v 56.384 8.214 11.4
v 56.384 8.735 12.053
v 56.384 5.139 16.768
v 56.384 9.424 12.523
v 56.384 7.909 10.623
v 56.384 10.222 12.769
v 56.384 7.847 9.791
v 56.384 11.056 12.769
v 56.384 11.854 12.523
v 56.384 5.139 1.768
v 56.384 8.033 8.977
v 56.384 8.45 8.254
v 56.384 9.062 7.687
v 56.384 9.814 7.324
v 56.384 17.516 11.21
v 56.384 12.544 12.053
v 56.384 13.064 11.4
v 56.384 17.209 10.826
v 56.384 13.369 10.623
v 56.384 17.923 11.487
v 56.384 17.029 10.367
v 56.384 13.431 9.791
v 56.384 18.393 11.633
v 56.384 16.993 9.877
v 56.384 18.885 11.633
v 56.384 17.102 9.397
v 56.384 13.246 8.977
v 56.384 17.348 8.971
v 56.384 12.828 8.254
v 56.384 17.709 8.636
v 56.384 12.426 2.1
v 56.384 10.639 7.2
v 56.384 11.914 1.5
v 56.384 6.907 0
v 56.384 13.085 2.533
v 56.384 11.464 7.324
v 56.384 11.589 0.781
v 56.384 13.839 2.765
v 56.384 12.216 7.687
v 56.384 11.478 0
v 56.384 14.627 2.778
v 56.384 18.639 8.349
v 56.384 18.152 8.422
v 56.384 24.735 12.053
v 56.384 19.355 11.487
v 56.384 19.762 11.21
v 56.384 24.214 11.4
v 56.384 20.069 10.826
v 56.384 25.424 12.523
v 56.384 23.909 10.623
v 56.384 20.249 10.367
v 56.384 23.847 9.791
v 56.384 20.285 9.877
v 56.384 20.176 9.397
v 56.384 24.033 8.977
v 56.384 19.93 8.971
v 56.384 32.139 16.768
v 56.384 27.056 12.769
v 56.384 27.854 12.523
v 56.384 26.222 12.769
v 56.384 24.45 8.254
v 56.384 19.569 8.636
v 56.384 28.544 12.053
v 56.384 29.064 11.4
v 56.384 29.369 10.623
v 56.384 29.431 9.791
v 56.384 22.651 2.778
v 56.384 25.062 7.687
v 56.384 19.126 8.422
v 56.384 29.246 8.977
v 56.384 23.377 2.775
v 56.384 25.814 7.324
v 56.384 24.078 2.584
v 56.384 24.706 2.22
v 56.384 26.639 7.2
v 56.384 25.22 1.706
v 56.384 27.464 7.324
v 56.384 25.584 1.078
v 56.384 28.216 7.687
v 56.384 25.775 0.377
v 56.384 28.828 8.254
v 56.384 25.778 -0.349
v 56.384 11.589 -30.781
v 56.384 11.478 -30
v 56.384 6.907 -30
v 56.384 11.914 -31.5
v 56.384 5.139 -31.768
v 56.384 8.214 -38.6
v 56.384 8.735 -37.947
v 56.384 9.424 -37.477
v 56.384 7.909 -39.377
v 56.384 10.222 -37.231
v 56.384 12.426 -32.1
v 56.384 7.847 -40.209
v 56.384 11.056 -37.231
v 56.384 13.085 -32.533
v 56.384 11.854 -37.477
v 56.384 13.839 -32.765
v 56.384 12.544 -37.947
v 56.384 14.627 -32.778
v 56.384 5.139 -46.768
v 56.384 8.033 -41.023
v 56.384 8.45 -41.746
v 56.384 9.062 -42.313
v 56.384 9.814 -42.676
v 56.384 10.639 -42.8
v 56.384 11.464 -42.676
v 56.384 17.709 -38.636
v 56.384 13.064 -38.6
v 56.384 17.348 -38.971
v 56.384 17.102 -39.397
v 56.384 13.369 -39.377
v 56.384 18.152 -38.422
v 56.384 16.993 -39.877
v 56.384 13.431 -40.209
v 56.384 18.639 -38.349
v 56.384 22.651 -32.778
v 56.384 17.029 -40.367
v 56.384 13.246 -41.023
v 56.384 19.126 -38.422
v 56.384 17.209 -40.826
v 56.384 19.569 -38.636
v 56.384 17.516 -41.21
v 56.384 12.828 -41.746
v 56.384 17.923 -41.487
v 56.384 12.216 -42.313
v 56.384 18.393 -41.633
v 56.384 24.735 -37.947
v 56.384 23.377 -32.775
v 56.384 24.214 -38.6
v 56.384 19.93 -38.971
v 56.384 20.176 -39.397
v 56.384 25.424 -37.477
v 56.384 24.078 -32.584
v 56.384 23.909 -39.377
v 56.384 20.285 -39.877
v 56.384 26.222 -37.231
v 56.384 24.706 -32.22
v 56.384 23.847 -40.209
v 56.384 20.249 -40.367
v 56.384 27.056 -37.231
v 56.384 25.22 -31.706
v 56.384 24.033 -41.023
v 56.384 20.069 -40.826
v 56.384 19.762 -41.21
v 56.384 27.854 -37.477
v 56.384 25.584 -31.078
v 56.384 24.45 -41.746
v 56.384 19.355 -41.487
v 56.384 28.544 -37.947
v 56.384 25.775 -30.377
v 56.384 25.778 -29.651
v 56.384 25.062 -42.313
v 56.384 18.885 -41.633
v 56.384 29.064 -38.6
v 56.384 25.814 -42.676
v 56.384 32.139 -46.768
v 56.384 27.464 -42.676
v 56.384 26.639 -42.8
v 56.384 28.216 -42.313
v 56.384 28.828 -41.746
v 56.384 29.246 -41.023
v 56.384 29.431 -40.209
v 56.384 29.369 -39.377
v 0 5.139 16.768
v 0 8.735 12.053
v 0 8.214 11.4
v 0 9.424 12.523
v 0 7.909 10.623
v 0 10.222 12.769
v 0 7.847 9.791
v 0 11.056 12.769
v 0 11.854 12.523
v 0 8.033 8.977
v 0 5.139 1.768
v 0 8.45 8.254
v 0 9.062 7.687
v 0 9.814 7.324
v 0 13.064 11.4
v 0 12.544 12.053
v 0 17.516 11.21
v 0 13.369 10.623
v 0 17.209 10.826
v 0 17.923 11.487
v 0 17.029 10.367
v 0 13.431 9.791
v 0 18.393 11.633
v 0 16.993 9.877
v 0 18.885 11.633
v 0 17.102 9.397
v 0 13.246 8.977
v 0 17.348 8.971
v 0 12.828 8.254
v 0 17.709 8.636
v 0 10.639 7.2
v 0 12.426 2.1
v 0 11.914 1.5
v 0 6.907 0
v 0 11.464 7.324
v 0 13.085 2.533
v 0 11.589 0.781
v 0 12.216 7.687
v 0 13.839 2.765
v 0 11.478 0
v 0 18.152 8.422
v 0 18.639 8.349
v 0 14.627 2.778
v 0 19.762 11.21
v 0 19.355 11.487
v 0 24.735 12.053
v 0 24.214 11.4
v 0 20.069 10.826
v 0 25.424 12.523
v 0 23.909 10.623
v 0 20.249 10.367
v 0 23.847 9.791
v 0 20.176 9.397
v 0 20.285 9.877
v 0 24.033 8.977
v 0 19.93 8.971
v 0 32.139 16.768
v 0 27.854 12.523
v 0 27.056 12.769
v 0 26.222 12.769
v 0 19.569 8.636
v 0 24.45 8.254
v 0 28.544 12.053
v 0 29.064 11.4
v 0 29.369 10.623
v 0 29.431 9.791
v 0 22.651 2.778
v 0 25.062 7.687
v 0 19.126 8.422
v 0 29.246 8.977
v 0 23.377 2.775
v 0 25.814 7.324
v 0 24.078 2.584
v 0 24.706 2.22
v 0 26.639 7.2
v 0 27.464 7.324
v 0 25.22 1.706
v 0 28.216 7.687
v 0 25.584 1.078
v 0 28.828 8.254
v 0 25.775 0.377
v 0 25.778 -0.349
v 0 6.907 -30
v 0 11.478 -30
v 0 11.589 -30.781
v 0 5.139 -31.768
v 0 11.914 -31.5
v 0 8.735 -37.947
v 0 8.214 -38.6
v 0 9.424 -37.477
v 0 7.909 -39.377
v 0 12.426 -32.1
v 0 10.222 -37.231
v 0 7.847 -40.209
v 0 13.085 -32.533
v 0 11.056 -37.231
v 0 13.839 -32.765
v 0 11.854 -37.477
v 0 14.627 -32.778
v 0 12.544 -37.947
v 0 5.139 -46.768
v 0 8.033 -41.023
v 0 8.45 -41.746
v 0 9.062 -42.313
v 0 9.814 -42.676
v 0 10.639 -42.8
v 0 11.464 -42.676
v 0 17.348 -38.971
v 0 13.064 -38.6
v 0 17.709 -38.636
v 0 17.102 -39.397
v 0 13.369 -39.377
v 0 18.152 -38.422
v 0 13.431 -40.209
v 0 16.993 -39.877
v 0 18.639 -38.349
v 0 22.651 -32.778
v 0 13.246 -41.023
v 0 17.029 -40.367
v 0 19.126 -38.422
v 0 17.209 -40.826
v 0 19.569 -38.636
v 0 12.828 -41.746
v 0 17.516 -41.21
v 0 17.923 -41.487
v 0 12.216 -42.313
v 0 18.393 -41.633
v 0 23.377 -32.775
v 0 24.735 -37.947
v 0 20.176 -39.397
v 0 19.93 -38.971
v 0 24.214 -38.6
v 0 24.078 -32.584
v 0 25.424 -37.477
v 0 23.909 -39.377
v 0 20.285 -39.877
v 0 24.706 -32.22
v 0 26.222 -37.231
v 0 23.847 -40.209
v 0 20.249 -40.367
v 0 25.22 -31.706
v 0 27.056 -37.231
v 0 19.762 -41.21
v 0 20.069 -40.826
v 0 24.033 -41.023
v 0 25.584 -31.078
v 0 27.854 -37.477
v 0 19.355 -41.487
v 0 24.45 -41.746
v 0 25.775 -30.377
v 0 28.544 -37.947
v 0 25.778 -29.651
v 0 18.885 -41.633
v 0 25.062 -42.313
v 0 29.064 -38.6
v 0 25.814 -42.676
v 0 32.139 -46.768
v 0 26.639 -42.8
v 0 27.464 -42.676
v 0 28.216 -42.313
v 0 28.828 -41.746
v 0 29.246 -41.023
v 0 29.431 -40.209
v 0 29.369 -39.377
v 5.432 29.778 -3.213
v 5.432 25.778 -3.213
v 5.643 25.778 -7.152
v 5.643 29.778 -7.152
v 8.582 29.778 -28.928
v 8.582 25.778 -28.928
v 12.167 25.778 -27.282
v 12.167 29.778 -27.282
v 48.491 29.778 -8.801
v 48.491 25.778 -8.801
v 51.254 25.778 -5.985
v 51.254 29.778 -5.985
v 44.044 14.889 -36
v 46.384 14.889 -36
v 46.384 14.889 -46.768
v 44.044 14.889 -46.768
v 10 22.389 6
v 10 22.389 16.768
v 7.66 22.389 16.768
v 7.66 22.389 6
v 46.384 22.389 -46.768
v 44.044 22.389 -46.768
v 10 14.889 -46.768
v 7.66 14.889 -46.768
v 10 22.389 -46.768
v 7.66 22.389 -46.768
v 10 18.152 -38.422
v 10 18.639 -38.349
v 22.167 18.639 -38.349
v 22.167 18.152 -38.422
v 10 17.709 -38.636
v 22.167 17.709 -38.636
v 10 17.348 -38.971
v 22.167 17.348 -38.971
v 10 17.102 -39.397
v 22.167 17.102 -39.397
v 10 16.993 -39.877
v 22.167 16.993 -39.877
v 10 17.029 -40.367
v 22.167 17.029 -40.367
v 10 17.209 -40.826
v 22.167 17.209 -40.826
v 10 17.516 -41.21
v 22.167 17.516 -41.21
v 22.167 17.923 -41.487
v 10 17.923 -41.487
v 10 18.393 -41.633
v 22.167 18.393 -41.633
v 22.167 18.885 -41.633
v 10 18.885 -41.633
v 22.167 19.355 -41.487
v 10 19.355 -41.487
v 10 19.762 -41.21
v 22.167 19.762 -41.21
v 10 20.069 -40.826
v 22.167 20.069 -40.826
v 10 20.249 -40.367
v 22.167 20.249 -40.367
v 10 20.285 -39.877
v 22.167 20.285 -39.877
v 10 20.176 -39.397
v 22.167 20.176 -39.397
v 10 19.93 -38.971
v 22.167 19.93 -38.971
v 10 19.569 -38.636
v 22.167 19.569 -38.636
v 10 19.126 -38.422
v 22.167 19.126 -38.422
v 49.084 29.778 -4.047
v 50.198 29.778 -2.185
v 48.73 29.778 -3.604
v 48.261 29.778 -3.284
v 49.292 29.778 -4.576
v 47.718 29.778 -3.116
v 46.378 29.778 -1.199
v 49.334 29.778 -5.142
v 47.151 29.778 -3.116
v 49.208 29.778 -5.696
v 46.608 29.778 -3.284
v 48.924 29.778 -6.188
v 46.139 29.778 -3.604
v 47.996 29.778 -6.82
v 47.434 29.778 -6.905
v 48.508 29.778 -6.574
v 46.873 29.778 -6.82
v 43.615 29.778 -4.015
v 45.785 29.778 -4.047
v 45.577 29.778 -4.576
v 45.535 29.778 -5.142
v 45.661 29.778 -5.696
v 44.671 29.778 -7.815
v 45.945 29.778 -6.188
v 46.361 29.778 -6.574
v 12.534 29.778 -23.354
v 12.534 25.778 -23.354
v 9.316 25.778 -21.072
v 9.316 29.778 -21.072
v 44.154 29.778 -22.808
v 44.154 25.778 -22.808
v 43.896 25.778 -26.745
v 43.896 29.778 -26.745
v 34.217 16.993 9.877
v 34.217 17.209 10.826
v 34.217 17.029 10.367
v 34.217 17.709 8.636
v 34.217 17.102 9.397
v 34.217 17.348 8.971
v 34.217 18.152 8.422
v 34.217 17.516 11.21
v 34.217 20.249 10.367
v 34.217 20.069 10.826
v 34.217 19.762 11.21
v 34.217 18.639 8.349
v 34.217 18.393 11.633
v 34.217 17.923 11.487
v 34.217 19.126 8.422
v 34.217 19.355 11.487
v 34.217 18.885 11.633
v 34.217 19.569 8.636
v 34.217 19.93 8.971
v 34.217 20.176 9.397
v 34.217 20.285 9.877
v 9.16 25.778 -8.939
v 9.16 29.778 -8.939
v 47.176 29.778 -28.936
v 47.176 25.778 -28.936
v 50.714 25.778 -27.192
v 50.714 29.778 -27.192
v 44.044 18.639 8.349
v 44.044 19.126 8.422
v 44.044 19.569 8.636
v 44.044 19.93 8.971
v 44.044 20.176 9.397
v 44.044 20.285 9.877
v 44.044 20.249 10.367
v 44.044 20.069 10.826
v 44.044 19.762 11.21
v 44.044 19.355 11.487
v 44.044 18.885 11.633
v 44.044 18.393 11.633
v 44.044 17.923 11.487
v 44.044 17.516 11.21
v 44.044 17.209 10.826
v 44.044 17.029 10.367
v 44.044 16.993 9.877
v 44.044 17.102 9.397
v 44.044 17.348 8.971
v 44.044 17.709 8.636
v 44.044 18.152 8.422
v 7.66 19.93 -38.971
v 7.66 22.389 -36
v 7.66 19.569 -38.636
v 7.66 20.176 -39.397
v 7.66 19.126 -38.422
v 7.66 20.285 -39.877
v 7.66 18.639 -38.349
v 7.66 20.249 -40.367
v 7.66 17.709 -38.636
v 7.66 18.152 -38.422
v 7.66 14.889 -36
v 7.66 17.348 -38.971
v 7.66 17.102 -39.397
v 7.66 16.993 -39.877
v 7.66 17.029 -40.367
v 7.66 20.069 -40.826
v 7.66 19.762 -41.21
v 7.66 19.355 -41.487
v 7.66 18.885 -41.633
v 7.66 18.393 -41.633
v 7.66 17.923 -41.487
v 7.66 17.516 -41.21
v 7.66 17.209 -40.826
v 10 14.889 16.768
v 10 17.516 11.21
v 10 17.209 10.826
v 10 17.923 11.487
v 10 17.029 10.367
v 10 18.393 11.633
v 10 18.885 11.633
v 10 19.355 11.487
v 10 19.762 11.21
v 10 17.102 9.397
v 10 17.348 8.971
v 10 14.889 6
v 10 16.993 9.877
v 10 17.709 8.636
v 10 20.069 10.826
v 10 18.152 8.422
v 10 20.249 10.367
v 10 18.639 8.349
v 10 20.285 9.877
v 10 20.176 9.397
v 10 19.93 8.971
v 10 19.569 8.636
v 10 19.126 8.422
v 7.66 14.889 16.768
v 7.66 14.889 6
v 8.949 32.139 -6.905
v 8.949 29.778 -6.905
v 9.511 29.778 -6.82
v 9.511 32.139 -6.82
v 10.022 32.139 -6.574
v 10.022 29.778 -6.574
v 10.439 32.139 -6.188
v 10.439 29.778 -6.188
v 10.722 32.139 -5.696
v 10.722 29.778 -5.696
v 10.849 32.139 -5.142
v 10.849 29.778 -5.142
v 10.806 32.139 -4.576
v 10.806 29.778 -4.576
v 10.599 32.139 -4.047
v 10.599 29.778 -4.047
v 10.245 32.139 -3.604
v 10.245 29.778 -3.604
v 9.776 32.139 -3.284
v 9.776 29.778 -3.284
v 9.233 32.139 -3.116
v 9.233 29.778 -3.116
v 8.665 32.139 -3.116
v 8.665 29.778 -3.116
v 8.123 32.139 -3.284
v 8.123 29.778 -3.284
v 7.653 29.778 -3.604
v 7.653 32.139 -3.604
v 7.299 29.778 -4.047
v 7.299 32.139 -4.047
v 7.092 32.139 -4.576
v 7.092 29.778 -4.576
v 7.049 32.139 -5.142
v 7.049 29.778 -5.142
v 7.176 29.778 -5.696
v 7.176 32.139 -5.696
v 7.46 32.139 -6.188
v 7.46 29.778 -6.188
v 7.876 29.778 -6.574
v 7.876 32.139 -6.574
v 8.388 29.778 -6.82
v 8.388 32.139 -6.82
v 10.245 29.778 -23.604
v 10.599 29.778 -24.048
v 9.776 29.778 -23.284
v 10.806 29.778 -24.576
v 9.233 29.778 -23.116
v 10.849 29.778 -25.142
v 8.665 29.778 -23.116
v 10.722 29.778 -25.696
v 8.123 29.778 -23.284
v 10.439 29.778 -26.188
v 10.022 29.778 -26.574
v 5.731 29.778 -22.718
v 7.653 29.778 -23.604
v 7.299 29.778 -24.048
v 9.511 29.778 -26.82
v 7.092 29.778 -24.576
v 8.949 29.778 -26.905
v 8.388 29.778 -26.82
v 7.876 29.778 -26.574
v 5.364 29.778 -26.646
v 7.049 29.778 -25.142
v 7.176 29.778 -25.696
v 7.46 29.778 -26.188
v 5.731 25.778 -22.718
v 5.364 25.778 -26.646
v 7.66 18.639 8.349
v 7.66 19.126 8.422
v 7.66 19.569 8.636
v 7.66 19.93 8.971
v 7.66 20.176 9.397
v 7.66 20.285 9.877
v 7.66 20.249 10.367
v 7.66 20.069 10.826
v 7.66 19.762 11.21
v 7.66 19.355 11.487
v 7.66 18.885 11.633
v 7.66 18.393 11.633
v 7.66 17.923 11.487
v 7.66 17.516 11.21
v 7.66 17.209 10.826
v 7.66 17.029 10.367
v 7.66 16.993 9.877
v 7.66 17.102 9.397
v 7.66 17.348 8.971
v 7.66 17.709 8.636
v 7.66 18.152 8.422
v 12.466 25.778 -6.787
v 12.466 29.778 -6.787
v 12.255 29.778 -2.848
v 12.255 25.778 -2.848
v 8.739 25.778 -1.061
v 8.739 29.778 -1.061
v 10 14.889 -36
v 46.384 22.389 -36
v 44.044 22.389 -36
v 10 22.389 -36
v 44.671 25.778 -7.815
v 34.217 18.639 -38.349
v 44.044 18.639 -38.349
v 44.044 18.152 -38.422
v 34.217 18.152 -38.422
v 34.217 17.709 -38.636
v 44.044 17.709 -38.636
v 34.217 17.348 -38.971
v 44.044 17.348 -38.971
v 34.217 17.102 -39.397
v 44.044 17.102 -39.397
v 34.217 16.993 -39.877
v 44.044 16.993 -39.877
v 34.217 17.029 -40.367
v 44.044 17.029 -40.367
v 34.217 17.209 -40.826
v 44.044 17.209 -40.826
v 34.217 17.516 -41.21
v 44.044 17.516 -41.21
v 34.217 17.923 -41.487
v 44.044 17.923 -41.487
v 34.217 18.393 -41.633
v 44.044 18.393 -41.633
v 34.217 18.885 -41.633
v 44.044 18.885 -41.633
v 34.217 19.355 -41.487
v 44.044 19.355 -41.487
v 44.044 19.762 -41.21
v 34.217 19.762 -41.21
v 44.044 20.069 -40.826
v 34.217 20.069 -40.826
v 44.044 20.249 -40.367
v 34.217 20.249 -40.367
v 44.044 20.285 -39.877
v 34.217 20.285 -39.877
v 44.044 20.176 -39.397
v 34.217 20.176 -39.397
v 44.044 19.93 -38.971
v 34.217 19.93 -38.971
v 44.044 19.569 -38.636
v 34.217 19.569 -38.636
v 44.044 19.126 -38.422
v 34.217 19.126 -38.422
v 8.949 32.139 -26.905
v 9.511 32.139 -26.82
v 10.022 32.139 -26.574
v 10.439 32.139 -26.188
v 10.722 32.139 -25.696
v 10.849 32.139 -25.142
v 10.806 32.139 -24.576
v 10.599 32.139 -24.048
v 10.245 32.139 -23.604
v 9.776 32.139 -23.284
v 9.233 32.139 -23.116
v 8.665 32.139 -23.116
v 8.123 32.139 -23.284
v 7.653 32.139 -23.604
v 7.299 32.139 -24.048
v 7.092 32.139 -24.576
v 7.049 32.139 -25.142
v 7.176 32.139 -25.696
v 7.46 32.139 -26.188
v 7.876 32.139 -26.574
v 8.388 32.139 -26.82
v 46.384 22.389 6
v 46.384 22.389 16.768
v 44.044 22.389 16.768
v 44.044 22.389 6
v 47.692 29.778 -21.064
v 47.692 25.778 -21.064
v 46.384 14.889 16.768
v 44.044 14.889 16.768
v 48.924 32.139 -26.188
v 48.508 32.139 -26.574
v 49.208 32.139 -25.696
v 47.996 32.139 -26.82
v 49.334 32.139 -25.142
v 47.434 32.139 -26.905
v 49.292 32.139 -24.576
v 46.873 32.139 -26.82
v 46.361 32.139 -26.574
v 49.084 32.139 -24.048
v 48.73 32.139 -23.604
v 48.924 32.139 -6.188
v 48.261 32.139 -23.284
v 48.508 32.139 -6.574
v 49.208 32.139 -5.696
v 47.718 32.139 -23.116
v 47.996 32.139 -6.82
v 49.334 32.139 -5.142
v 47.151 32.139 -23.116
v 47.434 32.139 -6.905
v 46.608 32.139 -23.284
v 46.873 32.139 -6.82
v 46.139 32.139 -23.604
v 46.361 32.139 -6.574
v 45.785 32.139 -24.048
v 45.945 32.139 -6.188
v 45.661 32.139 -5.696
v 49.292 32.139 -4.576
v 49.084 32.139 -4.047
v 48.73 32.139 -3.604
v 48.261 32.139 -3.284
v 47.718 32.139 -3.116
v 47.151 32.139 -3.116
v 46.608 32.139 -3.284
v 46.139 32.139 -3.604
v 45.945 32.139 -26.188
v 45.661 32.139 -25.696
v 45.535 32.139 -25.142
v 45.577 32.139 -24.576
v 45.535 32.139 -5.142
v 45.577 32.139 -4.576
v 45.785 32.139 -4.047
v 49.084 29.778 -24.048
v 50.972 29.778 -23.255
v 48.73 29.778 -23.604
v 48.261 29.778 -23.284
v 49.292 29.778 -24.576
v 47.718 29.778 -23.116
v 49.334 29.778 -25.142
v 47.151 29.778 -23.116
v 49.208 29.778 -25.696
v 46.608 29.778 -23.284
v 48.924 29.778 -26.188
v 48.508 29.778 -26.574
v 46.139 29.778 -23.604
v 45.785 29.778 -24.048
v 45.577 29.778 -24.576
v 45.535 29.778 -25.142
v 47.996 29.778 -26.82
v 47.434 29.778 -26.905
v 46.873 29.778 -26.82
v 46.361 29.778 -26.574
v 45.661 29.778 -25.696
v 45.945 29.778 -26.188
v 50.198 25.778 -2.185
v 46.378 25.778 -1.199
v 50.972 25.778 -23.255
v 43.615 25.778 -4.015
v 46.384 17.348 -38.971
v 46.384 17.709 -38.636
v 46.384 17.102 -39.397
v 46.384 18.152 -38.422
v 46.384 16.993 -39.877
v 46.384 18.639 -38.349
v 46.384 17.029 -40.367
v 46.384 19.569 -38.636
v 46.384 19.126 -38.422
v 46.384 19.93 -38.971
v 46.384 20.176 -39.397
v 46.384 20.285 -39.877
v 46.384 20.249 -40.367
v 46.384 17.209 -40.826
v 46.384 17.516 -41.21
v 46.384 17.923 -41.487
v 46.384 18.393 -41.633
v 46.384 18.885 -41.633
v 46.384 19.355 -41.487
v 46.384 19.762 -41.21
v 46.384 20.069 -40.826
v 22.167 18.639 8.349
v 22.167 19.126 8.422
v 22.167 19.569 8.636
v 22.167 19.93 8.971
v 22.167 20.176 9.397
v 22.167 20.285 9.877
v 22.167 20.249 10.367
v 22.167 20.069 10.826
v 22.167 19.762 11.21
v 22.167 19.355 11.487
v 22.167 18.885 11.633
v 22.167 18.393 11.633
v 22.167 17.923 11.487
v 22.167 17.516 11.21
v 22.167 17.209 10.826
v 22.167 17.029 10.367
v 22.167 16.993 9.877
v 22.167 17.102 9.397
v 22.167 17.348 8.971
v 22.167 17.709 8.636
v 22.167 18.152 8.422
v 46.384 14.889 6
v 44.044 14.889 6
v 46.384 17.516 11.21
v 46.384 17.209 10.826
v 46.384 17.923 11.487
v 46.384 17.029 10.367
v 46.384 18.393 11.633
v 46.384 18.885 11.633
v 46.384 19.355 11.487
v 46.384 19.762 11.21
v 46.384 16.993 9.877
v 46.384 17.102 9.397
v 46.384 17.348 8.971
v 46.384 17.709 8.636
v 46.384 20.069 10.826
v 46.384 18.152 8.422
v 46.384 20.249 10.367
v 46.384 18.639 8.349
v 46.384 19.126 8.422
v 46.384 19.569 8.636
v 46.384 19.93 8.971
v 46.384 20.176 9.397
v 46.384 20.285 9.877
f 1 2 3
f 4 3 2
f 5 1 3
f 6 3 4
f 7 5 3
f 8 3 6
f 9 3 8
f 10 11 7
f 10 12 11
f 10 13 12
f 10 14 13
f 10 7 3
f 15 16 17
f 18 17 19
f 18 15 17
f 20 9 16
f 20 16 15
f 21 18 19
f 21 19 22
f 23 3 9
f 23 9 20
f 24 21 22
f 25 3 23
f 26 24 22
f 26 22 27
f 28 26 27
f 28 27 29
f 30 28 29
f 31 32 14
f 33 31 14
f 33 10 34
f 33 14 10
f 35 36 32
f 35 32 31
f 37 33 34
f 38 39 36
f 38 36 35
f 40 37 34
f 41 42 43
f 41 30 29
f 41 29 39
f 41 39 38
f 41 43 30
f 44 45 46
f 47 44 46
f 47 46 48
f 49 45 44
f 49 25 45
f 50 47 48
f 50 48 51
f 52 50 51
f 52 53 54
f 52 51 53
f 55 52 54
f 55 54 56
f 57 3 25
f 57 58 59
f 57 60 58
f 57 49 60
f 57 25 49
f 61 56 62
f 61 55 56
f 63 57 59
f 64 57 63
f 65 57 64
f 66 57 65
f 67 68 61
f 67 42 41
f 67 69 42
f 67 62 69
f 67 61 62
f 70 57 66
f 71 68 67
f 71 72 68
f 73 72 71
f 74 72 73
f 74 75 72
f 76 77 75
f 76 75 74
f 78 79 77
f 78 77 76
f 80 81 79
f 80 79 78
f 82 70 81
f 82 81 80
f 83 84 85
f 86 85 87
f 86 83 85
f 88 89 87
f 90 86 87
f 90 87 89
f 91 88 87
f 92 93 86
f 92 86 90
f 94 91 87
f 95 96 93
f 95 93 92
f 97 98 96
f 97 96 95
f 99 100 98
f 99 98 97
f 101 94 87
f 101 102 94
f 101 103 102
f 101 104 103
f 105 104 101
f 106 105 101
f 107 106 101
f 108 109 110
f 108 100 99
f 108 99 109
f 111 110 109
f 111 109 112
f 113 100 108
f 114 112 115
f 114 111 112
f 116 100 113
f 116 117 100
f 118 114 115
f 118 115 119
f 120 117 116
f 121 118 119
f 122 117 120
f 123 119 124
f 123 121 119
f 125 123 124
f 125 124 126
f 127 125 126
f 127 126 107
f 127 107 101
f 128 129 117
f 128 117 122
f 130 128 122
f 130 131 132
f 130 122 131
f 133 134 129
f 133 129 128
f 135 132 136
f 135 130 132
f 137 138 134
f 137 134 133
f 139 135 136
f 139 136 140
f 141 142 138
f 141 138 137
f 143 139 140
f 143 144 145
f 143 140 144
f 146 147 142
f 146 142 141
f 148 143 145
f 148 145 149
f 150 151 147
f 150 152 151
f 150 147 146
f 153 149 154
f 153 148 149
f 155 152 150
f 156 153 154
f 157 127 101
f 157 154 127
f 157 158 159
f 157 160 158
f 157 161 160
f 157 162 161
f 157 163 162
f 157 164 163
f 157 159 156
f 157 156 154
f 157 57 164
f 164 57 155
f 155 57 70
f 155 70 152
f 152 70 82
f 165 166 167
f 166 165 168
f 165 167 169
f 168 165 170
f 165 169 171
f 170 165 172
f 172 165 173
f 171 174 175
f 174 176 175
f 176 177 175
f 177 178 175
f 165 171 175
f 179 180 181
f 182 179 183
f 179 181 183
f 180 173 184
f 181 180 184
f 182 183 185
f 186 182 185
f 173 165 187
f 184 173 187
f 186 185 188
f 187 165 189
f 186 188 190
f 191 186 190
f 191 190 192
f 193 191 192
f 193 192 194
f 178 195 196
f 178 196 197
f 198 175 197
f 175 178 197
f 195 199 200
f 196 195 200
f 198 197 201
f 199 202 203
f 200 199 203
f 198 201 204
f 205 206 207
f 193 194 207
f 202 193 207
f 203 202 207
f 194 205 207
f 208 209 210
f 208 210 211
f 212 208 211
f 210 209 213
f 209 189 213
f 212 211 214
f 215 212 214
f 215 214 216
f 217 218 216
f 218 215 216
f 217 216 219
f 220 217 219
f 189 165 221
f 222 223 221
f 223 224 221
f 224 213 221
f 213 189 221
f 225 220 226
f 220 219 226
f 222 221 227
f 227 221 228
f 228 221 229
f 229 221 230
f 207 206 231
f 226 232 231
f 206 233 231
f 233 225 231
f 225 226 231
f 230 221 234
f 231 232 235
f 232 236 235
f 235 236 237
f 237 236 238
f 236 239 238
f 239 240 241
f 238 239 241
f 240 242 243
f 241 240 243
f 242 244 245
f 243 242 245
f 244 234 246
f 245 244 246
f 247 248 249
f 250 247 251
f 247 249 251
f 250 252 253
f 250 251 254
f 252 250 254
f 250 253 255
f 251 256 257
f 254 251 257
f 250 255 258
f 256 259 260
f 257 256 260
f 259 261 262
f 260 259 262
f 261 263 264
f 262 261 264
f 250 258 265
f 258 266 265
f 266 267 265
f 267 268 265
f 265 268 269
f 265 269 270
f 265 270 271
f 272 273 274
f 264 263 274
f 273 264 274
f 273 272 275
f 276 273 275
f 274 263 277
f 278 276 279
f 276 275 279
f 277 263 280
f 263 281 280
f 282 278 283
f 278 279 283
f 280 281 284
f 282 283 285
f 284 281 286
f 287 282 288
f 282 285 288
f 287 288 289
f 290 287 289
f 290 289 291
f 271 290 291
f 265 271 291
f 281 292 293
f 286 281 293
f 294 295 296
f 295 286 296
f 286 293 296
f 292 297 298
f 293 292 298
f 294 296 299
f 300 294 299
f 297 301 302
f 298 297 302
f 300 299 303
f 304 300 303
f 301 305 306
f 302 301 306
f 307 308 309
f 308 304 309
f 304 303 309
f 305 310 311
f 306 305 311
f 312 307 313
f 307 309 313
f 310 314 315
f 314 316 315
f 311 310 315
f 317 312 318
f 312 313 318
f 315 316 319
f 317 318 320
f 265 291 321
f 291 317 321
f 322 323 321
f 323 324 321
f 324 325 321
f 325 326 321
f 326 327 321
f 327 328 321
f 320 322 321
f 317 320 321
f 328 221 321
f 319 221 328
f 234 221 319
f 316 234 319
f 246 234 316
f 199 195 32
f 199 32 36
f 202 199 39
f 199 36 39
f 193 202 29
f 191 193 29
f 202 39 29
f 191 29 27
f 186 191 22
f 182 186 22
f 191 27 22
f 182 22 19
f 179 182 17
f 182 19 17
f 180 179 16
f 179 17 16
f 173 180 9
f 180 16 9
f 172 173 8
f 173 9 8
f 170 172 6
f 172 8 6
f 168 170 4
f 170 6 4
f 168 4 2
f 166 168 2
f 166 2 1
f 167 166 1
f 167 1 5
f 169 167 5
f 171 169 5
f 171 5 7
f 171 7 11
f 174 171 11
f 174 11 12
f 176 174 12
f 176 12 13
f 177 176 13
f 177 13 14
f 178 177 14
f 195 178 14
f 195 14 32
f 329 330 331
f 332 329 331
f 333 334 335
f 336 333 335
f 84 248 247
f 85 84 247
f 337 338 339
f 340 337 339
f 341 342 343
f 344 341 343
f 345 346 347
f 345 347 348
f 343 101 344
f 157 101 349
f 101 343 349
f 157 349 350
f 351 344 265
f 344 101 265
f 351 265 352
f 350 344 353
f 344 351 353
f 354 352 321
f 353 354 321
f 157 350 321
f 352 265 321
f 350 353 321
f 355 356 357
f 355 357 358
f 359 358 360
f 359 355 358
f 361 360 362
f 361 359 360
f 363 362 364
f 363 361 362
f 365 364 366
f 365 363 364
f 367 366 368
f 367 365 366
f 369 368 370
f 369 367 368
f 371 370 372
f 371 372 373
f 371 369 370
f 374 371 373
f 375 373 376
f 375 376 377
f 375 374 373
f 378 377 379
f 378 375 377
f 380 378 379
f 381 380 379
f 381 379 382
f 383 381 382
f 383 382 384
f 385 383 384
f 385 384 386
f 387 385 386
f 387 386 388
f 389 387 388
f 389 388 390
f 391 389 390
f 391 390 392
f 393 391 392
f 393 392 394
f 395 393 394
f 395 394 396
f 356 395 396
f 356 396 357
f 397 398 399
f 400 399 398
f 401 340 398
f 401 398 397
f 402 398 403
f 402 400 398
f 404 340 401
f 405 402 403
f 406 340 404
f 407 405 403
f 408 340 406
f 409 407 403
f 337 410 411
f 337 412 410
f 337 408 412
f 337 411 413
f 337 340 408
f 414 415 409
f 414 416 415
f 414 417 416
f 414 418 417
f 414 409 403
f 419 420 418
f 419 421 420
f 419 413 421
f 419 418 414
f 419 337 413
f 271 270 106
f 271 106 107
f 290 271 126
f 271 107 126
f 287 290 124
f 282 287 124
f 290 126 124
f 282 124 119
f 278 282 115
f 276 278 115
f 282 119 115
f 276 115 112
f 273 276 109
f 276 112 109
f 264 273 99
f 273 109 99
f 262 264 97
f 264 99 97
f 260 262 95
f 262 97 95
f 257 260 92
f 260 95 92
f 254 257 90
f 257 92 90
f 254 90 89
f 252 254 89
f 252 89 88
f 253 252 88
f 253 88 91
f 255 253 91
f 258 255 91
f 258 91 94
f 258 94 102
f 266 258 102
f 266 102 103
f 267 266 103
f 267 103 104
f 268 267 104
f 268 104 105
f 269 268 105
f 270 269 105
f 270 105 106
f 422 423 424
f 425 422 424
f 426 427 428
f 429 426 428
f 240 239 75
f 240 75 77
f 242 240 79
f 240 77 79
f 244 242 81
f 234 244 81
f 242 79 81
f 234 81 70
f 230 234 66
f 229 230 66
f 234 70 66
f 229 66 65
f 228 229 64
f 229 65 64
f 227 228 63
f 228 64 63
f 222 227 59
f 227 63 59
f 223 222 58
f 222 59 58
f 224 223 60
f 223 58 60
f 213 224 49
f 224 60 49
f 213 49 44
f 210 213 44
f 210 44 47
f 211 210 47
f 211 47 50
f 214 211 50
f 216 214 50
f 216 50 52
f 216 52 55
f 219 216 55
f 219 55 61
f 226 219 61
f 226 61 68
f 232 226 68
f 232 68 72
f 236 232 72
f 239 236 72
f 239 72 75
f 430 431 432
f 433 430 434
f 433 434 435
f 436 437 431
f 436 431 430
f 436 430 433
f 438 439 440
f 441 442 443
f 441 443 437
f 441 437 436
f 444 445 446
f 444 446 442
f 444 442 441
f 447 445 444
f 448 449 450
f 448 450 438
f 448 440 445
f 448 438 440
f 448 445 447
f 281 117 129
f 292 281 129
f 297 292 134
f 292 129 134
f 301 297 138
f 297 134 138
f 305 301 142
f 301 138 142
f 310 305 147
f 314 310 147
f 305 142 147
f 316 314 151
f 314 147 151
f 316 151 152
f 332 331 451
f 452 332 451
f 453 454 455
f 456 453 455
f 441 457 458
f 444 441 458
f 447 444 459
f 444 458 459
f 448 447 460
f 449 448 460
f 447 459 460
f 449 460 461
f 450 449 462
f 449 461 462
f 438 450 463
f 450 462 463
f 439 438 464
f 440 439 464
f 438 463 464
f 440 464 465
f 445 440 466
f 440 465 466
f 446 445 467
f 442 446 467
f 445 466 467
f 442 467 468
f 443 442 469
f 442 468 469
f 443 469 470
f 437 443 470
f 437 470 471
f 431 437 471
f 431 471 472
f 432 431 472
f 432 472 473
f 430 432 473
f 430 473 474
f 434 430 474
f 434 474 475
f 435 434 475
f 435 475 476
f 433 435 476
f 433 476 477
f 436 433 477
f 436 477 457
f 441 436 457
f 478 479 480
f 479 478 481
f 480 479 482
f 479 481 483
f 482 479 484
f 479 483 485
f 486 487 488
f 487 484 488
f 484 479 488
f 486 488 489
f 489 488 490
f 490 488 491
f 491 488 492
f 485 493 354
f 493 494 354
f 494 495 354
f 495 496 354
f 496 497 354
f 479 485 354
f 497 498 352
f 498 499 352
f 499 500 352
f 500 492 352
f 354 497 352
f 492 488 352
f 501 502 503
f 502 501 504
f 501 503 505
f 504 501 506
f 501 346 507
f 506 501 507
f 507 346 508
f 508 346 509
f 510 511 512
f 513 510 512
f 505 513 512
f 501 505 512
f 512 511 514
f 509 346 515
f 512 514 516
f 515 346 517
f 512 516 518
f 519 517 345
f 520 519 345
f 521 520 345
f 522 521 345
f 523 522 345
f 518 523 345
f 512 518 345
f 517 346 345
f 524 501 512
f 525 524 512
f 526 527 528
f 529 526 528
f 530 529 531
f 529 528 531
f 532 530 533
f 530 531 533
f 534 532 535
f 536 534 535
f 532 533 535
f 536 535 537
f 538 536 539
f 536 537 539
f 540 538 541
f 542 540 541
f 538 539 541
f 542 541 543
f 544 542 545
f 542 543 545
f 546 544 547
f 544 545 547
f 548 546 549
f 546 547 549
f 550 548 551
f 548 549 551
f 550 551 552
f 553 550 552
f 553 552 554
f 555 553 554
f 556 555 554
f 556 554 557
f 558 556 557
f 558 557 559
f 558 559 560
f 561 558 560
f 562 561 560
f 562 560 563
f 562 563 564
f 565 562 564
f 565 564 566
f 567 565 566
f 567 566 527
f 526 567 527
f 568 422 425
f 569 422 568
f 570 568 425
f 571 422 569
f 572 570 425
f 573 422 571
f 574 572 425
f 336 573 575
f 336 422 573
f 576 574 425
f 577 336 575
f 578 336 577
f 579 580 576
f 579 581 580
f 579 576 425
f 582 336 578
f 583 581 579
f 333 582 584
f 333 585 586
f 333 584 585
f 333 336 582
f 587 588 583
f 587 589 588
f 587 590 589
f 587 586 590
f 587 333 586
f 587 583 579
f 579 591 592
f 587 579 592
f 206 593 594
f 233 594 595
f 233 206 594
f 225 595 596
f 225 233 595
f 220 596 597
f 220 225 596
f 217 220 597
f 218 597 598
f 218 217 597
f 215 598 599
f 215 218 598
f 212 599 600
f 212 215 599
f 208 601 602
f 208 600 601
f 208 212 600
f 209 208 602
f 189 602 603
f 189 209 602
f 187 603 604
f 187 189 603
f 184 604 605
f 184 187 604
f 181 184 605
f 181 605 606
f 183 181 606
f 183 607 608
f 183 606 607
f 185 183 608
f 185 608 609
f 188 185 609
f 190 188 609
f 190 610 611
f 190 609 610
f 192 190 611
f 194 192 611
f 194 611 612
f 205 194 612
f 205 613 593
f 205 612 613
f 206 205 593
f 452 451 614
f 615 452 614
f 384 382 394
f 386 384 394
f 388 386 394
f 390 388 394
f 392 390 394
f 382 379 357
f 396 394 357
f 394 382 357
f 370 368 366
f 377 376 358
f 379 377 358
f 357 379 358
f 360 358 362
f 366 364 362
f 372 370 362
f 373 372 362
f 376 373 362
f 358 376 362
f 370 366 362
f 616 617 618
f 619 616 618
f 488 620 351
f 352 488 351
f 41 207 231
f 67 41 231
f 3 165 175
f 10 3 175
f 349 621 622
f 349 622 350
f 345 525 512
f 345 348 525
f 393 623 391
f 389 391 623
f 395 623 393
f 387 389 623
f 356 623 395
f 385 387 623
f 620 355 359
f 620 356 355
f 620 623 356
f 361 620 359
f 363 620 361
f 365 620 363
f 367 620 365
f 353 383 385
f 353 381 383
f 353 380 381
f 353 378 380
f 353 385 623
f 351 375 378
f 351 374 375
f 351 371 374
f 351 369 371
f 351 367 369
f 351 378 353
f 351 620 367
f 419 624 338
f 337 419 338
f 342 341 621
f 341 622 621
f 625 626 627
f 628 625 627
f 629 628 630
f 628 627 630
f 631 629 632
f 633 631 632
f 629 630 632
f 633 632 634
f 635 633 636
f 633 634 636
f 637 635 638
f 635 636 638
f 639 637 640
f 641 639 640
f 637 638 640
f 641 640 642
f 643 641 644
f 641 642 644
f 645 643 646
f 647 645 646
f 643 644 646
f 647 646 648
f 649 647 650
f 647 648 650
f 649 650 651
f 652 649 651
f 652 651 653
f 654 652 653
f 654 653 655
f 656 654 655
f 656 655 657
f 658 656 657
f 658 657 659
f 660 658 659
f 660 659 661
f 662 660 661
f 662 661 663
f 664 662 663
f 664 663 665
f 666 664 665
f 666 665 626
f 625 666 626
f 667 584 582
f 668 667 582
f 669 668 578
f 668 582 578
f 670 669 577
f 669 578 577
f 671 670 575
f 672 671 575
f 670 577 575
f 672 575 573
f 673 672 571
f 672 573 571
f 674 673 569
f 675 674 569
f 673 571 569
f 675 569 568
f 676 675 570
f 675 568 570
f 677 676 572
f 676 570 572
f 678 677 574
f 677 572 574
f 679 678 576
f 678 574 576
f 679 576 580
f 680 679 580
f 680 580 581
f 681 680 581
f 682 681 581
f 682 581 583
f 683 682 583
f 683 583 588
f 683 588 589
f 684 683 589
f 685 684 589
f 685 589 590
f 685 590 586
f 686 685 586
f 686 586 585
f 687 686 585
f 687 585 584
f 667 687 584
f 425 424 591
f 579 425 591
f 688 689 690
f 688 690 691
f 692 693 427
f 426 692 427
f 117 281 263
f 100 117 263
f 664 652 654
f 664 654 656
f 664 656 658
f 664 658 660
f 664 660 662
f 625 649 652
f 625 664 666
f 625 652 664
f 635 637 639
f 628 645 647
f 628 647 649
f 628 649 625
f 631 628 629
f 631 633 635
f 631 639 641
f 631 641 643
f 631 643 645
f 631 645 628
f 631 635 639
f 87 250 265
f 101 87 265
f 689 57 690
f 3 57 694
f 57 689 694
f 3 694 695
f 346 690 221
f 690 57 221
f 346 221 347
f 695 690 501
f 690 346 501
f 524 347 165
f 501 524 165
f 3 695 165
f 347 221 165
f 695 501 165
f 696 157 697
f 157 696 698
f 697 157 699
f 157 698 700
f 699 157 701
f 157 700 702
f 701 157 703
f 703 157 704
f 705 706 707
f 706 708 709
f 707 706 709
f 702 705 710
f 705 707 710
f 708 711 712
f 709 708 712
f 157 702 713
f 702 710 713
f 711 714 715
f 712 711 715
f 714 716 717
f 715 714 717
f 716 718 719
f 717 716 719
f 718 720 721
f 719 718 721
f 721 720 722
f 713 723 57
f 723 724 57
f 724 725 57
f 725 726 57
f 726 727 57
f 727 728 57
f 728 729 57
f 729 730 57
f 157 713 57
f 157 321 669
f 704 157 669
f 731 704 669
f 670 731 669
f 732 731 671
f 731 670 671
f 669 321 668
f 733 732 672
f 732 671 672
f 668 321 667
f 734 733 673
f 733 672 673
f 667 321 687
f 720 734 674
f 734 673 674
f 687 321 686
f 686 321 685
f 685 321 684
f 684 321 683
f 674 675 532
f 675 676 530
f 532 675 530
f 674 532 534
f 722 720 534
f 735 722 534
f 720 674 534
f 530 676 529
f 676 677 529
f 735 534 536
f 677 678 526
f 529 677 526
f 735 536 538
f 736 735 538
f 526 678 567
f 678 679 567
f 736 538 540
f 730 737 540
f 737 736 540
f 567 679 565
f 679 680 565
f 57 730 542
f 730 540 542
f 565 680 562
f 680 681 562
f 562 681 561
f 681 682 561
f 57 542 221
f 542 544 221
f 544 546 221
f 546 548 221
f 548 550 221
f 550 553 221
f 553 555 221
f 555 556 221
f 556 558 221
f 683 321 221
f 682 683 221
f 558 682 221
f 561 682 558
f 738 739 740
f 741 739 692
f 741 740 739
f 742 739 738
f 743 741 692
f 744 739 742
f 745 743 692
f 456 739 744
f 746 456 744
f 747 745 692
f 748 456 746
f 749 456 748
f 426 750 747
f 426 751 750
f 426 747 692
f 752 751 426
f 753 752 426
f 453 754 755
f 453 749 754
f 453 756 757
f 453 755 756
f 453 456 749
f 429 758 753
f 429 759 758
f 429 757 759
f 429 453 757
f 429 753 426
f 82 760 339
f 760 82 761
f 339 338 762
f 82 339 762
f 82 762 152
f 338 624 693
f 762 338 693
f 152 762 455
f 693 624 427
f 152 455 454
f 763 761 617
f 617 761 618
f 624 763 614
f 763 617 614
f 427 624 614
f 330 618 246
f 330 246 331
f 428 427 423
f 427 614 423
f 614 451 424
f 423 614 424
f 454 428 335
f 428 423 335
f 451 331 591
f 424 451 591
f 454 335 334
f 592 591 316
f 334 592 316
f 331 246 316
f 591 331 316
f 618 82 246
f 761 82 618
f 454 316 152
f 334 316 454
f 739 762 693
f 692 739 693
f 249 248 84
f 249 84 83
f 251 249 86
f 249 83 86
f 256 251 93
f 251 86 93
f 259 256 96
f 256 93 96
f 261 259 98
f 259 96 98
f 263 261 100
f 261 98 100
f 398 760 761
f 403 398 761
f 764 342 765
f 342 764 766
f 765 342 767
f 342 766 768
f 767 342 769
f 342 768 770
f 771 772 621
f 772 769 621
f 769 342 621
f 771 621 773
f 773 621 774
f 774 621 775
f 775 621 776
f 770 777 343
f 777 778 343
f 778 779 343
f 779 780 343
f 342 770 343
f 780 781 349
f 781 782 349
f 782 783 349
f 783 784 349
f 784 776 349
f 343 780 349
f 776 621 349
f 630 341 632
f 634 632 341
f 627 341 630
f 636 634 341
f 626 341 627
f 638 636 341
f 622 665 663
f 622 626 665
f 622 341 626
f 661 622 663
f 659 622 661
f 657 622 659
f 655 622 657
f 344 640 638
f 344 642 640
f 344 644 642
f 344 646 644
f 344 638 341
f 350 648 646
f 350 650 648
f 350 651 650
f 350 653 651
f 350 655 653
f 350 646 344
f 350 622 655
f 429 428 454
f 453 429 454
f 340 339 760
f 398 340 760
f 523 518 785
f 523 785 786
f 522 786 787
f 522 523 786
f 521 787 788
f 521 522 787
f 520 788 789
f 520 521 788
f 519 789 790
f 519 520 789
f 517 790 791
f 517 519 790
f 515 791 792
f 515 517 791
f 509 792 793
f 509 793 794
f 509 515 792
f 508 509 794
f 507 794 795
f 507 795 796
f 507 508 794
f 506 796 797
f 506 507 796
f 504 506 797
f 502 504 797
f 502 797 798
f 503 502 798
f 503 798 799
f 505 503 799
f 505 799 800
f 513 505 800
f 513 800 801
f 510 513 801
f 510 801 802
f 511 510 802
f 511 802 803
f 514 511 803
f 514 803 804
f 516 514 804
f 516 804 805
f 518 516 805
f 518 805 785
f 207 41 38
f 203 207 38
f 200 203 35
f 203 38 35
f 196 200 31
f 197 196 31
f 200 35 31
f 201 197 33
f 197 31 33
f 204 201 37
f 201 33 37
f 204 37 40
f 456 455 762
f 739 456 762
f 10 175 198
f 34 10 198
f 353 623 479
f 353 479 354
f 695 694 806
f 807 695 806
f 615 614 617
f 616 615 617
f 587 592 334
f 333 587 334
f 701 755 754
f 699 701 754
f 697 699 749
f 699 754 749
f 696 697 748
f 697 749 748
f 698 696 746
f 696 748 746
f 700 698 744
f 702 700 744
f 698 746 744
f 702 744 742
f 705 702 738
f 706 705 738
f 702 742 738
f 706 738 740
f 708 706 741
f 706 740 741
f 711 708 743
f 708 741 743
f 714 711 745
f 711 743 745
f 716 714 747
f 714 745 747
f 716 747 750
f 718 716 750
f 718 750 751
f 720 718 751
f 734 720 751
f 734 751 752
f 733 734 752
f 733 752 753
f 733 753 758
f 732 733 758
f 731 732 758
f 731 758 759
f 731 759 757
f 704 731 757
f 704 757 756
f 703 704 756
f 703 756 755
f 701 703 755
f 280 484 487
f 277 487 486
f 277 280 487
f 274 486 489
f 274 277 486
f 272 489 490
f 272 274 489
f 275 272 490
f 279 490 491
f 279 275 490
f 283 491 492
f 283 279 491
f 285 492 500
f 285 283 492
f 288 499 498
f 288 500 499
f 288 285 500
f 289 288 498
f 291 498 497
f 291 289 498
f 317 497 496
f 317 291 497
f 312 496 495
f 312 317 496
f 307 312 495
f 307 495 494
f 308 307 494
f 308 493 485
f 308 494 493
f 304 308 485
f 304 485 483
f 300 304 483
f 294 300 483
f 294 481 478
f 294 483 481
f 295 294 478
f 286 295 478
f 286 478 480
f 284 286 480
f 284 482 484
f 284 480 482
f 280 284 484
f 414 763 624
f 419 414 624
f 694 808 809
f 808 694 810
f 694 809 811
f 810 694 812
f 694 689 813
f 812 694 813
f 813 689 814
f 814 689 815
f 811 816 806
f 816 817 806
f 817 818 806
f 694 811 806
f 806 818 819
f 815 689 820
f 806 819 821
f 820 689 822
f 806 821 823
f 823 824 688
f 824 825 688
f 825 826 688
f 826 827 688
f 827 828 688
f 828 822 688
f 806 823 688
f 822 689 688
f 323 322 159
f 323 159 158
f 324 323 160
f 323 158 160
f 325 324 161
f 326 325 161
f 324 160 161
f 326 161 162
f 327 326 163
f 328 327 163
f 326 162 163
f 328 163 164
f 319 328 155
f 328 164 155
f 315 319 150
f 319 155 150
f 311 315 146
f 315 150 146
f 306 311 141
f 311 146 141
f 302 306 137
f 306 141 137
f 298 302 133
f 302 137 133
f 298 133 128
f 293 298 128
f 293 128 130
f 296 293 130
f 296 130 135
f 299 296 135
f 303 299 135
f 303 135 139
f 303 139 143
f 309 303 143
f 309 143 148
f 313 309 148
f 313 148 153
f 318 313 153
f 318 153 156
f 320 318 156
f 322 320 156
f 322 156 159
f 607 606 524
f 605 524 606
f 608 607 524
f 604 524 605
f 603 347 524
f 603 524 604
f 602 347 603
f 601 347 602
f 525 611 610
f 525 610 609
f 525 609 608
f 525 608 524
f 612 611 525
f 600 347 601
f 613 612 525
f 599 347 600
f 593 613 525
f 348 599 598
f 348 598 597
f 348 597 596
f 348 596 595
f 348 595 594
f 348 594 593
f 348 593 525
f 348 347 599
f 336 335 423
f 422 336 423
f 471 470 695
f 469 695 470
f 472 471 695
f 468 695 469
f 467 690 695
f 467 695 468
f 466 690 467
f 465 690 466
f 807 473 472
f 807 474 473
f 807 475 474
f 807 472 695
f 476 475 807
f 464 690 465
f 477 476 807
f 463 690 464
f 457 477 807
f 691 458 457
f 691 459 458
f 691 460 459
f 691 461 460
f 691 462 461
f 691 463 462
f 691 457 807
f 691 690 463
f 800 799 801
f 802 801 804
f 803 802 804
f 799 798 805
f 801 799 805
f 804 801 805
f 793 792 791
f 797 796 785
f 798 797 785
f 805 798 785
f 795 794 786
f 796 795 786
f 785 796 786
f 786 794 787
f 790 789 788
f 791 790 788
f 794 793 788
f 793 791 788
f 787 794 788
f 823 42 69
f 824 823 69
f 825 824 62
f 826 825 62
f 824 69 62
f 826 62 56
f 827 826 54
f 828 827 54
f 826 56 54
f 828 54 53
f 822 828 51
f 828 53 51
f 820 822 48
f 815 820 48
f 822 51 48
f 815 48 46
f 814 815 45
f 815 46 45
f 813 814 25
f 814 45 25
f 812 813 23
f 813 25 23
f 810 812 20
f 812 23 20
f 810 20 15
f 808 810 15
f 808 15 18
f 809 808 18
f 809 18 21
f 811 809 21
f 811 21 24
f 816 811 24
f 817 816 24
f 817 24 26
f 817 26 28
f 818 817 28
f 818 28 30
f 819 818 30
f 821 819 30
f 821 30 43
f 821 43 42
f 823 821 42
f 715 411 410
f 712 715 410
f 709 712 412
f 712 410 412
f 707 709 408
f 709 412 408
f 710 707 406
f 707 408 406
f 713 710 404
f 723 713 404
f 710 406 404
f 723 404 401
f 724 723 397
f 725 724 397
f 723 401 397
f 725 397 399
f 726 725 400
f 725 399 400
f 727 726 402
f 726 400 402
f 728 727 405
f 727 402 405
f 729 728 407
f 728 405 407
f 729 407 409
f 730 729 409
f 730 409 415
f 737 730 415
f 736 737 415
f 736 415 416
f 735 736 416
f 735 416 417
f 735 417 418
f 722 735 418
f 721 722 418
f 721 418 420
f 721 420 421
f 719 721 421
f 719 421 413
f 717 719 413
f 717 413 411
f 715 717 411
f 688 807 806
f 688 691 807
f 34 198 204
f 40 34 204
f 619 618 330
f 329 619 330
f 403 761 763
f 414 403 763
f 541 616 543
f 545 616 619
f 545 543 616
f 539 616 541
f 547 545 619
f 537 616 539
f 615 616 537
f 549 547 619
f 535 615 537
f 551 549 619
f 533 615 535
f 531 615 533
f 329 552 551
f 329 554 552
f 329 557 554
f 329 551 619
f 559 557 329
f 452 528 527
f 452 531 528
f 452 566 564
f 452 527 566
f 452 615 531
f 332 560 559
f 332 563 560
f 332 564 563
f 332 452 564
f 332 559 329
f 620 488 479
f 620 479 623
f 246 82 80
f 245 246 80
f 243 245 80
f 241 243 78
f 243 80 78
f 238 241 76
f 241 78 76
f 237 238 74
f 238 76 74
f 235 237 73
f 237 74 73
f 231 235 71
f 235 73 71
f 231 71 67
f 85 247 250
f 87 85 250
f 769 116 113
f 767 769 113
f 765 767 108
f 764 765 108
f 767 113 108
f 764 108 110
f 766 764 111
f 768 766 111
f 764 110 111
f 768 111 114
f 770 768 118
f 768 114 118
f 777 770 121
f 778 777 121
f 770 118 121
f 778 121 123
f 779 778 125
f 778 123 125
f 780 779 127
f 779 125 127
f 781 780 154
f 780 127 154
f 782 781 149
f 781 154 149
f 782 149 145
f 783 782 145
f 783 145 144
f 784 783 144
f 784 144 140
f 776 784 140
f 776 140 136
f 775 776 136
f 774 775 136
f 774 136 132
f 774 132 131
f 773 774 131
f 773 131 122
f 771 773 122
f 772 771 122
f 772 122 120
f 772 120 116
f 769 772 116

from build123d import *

# Parameters (mm, degrees)
SKETCH2_R           = 2.778125
BOSS_EXTRUDE2_DEPTH = 56.3835756
SKETCH3_R           = 1.651
CUT_EXTRUDE1_DEPTH  = 22.1668
SKETCH4_W           = 10.767766953
SKETCH4_H           = 2.34
CUT_EXTRUDE2_DEPTH  = 3.75
SKETCH5_R           = 2.8
CUT_EXTRUDE3_DEPTH  = 80.995318373
SKETCH6_R           = 1.905
CUT_EXTRUDE4_DEPTH  = 77.107177875
CUT_EXTRUDE5_DEPTH  = 4


with BuildPart() as part:
    # Sketch2 → Boss-Extrude2 (new body)
    with BuildSketch(Plane(origin=(0, 0, 0), x_dir=(0, 0, -1), z_dir=(1, 0, 0))):
        with BuildLine():
            Line((0, 25.778125), (30, 25.778125))
            ThreePointArc((30, 25.778125), (31.964431026, 24.964431026), (32.778125, 23))
            Line((32.778125, 23), (32.778125, 14.278125))
            ThreePointArc((32.778125, 14.278125), (31.964431026, 12.313693974), (30, 11.5))
            Line((30, 11.5), (30, 6.906829453))
            Line((30, 6.906829453), (31.767766953, 5.1390625))
            Line((31.767766953, 5.1390625), (46.767766953, 5.1390625))
            Line((46.767766953, 5.1390625), (46.767766953, 32.1390625))
            Line((46.767766953, 32.1390625), (-16.767766953, 32.1390625))
            Line((-16.767766953, 32.1390625), (-16.767766953, 5.1390625))
            Line((-16.767766953, 5.1390625), (-1.767766953, 5.1390625))
            Line((-1.767766953, 5.1390625), (0, 6.906829453))
            Line((0, 6.906829453), (0, 11.5))
            ThreePointArc((0, 11.5), (-1.964431026, 12.313693974), (-2.778125, 14.278125))
            Line((-2.778125, 14.278125), (-2.778125, 23))
            ThreePointArc((-2.778125, 23), (-1.964431026, 24.964431026), (0, 25.778125))
        make_face()
        with Locations((-10, 26.6390625)):
            Circle(SKETCH2_R, mode=Mode.SUBTRACT)
        with Locations((-10, 10.6390625)):
            Circle(SKETCH2_R, mode=Mode.SUBTRACT)
        with Locations((40, 10.6390625)):
            Circle(SKETCH2_R, mode=Mode.SUBTRACT)
        with Locations((40, 26.6390625)):
            Circle(SKETCH2_R, mode=Mode.SUBTRACT)
    extrude(amount=BOSS_EXTRUDE2_DEPTH)

    # Sketch3 → Cut-Extrude1 (cut)
    with BuildSketch(Plane(origin=(56.3835756, 0, 0), x_dir=(0, 0, -1), z_dir=(1, 0, 0))):
        with Locations((-10, 18.6390625)):
            Circle(SKETCH3_R)
        with Locations((40, 18.6390625)):
            Circle(SKETCH3_R)
    cut_extrude1 = extrude(amount=-CUT_EXTRUDE1_DEPTH, mode=Mode.SUBTRACT)

    # Sketch4 → Cut-Extrude2 (cut, symmetric)
    with BuildSketch(Plane(origin=(0, 18.6390625, 0), x_dir=(0, 0, -1), z_dir=(0, -1, 0))):
        with Locations((-11.383883477, 45.2135756)):
            Rectangle(SKETCH4_W, SKETCH4_H)
        with Locations((41.383883477, 45.2135756)):
            Rectangle(SKETCH4_W, SKETCH4_H)
        with Locations((-11.383883477, 8.83)):
            Rectangle(SKETCH4_W, SKETCH4_H)
        with Locations((41.383883477, 8.83)):
            Rectangle(SKETCH4_W, SKETCH4_H)
    extrude(amount=CUT_EXTRUDE2_DEPTH, both=True, mode=Mode.SUBTRACT)

    # Sketch5 → Cut-Extrude3 (cut, through all)
    with BuildSketch(Plane(origin=(56.3835756, 0, 0), x_dir=(0, 0, -1), z_dir=(1, 0, 0))):
        with Locations((-10, 26.6390625)):
            Circle(SKETCH5_R)
        with Locations((0, 23)):
            Circle(SKETCH5_R)
        with Locations((-10, 10.6390625)):
            Circle(SKETCH5_R)
        with Locations((40, 26.6390625)):
            Circle(SKETCH5_R)
        with Locations((40, 10.6390625)):
            Circle(SKETCH5_R)
        with Locations((30, 23)):
            Circle(SKETCH5_R)
        with Locations((0, 14.278125)):
            Circle(SKETCH5_R)
        with Locations((30, 14.278125)):
            Circle(SKETCH5_R)
    extrude(amount=-CUT_EXTRUDE3_DEPTH, mode=Mode.SUBTRACT)

    # Mirror1: Cut-Extrude1 across plane
    add(cut_extrude1.mirror(Plane.ZY.offset(-28.1917878)), mode=Mode.SUBTRACT)

    # Sketch6 → Cut-Extrude4 (cut, through all)
    with BuildSketch(Plane.XZ.offset(-25.778125)):
        with Locations((8.949145412, -5)):
            Circle(SKETCH6_R)
        with Locations((47.434430188, -5)):
            Circle(SKETCH6_R)
        with Locations((47.434430188, -25)):
            Circle(SKETCH6_R)
        with Locations((8.949145412, -25)):
            Circle(SKETCH6_R)
    extrude(amount=-CUT_EXTRUDE4_DEPTH, mode=Mode.SUBTRACT)

    # Sketch7 → Cut-Extrude5 (cut)
    with BuildSketch(Plane(origin=(0, 25.778125, 0), x_dir=(-1, 0, 0), z_dir=(0, -1, 0))):
        Polygon((-12.166931132, 27.281957343), (-12.534271302, 23.354294494), (-9.316485582, 21.072337151), (-5.731359693, 22.718042657), (-5.364019523, 26.645705506), (-8.581805243, 28.927662849), align=None)
        Polygon((-12.465792586, 6.787363117), (-12.255370864, 2.84817577), (-8.73872369, 1.060812653), (-5.432498239, 3.212636883), (-5.642919961, 7.15182423), (-9.159567134, 8.939187347), align=None)
        Polygon((-44.671186116, 7.815307524), (-48.490935987, 8.800693325), (-51.254180059, 5.985385801), (-50.197674259, 2.184692476), (-46.377924389, 1.199306675), (-43.614680317, 4.014614199), align=None)
        Polygon((-43.896441738, 26.74473837), (-47.176423714, 28.936357061), (-50.714412164, 27.191618691), (-50.972418638, 23.25526163), (-47.692436661, 21.063642939), (-44.154448211, 22.808381309), align=None)
    extrude(amount=-CUT_EXTRUDE5_DEPTH, mode=Mode.SUBTRACT)


solid = part.part
